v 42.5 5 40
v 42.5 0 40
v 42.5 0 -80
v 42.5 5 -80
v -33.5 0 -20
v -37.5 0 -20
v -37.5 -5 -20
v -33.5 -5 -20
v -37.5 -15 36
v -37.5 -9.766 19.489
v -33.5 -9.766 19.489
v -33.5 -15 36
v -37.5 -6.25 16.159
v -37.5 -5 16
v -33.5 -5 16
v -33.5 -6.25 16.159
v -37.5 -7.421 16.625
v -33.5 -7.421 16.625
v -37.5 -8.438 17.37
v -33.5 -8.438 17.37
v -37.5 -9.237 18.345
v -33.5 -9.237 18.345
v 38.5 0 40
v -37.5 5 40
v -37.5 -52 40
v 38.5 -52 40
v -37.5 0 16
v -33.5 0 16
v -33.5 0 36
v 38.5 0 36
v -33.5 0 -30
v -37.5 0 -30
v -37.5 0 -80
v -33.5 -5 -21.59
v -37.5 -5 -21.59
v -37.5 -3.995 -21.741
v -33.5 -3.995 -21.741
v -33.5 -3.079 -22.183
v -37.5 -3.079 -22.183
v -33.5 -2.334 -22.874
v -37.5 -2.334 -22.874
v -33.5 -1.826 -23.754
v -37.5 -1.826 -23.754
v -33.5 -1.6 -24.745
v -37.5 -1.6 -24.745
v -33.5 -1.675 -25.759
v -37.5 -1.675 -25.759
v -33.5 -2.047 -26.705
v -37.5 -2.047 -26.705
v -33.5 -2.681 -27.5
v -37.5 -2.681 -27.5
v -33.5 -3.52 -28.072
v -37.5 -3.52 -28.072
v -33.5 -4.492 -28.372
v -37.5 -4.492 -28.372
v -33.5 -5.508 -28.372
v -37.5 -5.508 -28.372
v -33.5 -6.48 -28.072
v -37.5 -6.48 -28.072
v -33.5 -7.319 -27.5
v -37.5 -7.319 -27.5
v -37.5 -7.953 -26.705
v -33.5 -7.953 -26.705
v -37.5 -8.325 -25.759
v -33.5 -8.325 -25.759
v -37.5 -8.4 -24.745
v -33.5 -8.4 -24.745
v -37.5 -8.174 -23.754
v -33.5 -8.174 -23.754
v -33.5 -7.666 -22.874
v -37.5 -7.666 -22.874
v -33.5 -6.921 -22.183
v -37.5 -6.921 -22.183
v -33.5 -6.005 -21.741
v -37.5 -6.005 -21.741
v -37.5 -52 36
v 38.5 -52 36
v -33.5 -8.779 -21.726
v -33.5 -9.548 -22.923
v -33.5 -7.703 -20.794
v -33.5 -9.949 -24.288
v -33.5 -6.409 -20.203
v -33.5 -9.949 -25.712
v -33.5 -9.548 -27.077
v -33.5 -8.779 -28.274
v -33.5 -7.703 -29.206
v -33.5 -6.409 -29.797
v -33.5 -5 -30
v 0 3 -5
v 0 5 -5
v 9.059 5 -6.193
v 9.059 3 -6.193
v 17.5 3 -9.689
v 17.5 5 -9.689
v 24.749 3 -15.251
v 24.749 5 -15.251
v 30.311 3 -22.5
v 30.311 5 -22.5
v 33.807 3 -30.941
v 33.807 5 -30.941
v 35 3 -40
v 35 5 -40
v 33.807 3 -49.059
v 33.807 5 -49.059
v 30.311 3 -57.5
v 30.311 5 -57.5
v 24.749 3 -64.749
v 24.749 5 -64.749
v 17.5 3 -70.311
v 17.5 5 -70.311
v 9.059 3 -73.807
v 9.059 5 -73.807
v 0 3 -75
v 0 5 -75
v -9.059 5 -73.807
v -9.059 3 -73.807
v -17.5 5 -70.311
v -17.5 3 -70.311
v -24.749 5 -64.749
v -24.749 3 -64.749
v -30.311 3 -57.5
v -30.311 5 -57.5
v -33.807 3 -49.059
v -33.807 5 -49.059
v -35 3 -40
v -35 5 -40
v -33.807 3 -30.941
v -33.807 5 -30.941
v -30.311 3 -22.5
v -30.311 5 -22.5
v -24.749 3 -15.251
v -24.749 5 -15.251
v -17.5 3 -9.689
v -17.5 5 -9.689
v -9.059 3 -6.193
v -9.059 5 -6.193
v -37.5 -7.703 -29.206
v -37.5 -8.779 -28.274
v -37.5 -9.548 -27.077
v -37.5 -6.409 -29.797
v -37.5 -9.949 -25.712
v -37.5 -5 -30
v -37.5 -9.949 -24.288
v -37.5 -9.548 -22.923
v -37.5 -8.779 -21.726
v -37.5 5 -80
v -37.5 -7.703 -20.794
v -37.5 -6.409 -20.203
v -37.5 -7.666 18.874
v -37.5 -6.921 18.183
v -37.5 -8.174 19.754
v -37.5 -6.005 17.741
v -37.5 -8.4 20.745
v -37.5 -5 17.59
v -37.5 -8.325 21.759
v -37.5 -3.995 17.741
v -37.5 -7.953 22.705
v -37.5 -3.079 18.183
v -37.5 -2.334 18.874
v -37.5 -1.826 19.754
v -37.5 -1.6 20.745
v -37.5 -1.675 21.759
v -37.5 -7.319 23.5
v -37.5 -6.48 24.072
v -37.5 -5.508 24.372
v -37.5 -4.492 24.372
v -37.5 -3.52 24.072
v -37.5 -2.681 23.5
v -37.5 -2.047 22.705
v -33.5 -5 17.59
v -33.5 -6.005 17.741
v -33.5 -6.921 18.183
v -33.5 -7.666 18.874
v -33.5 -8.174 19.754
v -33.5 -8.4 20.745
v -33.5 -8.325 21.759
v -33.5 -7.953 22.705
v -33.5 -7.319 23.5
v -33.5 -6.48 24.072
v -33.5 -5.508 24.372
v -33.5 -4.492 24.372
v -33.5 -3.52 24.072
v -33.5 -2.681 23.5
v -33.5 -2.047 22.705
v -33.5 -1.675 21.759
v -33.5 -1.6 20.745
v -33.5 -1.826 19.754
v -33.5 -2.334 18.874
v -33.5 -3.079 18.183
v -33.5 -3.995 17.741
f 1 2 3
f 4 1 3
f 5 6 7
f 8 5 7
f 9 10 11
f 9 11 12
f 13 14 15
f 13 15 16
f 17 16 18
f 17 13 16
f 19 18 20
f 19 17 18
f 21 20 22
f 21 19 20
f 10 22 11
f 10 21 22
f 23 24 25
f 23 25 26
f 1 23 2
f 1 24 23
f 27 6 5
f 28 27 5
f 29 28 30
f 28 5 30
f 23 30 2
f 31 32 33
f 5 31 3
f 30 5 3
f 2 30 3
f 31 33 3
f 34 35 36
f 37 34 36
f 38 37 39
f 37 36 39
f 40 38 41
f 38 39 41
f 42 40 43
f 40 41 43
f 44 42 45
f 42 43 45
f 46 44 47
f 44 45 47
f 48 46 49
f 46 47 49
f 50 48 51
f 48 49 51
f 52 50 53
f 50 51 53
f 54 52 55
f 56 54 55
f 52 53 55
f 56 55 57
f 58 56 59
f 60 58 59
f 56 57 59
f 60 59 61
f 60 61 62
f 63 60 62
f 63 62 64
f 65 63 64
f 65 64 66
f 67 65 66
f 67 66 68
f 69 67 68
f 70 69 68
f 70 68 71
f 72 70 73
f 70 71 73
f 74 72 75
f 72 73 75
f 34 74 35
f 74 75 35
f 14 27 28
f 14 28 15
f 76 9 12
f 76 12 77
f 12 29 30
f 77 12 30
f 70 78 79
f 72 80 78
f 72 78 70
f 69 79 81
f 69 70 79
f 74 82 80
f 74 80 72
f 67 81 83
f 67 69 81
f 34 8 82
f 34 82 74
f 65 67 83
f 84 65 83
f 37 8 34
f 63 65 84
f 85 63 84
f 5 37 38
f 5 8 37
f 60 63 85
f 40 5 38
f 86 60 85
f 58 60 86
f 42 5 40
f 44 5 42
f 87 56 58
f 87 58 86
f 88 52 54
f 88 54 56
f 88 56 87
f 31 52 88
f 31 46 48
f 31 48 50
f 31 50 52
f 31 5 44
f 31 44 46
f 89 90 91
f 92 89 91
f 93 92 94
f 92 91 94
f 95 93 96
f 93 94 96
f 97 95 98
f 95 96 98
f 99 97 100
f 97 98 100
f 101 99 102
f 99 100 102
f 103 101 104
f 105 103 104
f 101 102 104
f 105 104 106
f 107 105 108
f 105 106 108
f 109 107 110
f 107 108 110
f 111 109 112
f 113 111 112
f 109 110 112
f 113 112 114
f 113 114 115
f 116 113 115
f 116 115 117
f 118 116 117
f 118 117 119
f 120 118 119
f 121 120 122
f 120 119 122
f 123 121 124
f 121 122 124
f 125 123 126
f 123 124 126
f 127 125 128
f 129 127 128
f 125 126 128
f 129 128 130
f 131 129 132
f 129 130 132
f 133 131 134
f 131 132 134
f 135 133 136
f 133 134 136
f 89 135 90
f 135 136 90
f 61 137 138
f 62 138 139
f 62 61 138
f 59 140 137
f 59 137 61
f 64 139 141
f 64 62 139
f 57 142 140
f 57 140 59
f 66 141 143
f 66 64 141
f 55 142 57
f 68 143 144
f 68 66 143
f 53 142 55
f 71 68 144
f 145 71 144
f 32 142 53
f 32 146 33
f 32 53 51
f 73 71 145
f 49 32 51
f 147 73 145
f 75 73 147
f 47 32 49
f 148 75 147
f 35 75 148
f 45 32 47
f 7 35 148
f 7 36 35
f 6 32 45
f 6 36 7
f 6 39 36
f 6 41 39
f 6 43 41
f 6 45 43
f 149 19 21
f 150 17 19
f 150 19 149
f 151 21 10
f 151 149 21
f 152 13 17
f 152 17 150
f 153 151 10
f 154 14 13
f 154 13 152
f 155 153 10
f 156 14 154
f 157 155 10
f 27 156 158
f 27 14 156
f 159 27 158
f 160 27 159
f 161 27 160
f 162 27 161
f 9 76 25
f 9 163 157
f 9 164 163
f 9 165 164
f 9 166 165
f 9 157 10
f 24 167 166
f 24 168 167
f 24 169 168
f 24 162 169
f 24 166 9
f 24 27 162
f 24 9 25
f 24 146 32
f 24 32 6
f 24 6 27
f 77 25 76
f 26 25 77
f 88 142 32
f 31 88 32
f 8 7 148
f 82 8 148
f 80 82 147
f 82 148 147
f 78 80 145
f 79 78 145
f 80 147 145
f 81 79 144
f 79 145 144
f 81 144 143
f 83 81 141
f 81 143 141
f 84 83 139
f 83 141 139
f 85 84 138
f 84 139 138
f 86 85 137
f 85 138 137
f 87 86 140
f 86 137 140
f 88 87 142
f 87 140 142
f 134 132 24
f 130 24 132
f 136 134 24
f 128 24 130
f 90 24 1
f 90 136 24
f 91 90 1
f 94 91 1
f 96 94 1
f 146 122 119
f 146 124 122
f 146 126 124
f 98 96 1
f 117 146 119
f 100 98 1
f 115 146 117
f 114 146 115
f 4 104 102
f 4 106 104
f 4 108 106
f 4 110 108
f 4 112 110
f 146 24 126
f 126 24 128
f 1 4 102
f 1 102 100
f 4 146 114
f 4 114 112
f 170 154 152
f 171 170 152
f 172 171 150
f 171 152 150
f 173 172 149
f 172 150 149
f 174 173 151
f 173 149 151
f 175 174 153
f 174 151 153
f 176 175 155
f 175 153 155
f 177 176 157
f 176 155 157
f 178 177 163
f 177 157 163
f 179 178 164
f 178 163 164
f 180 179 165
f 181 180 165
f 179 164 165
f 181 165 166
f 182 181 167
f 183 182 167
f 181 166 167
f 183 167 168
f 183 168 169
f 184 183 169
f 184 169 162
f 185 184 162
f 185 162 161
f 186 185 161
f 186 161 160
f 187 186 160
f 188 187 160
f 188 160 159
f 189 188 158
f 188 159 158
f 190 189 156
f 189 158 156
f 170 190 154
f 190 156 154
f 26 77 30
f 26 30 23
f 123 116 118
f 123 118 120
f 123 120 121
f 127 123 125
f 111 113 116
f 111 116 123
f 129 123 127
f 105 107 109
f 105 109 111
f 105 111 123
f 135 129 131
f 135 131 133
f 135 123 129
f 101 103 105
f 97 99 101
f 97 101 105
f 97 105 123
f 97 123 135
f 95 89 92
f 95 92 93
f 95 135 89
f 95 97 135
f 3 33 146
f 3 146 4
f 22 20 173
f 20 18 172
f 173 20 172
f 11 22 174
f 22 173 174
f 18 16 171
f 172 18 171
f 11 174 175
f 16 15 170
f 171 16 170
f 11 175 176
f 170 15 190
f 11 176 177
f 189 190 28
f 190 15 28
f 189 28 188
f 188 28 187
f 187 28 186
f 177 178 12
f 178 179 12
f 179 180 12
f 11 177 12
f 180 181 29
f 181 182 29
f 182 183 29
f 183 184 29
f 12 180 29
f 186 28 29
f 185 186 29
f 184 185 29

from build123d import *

# Parameters (mm, degrees)
SKETCH1_W           = 80
SKETCH1_H           = 120
BOSS_EXTRUDE1_DEPTH = 5
SKETCH2_W           = 76
SKETCH2_H           = 4
BOSS_EXTRUDE2_DEPTH = 52
SKETCH4_R           = 3.41
BOSS_EXTRUDE3_DEPTH = 4
SKETCH5_R           = 35
CUT_EXTRUDE1_DEPTH  = 2


with BuildPart() as part:
    # Sketch1 → Boss-Extrude1 (new body)
    with BuildSketch(Plane(origin=(0, 0, 0), x_dir=(1, 0, 0), z_dir=(0, 1, 0))):
        with Locations((2.5, 20)):
            Rectangle(SKETCH1_W, SKETCH1_H)
    extrude(amount=BOSS_EXTRUDE1_DEPTH)

    # Sketch2 → Boss-Extrude2 (add)
    with BuildSketch(Plane.XZ):
        with Locations((0.5, 38)):
            Rectangle(SKETCH2_W, SKETCH2_H)
    extrude(amount=BOSS_EXTRUDE2_DEPTH)

    # Sketch4 → Boss-Extrude3 (add)
    # profile 1 of 2: a face of its own
    with BuildSketch(Plane.ZY.offset(37.5)):
        with BuildLine():
            Line((-30, 0), (-20, 0))
            Line((-20, 0), (-20, -5))
            ThreePointArc((-20, -5), (-25, -10), (-30, -5))
            Line((-30, -5), (-30, 0))
        make_face()
        with Locations((-25, -5)):
            Circle(SKETCH4_R, mode=Mode.SUBTRACT)
    # profile 2 of 2: a face of its own
    with BuildSketch(Plane.ZY.offset(37.5)):
        with BuildLine():
            Line((16, 0), (16, -5))
            ThreePointArc((16, -5), (16.965508893, -7.953452473), (19.489152604, -9.766271094))
            Line((19.489152604, -9.766271094), (36, -15))
            Line((36, -15), (36, 0))
            Line((36, 0), (26, 0))
            Line((26, 0), (16, 0))
        make_face()
        with Locations(Location((21, -5, 0), (0, 0, 180))):
            Circle(SKETCH4_R, mode=Mode.SUBTRACT)
    extrude(amount=-BOSS_EXTRUDE3_DEPTH)

    # Sketch5 → Cut-Extrude1 (cut)
    with BuildSketch(Plane(origin=(0, 5, 0), x_dir=(1, 0, 0), z_dir=(0, 1, 0))):
        with Locations(Location((0, 40, 0), (0, 0, 270))):
            Circle(SKETCH5_R)
    extrude(amount=-CUT_EXTRUDE1_DEPTH, mode=Mode.SUBTRACT)


solid = part.part
